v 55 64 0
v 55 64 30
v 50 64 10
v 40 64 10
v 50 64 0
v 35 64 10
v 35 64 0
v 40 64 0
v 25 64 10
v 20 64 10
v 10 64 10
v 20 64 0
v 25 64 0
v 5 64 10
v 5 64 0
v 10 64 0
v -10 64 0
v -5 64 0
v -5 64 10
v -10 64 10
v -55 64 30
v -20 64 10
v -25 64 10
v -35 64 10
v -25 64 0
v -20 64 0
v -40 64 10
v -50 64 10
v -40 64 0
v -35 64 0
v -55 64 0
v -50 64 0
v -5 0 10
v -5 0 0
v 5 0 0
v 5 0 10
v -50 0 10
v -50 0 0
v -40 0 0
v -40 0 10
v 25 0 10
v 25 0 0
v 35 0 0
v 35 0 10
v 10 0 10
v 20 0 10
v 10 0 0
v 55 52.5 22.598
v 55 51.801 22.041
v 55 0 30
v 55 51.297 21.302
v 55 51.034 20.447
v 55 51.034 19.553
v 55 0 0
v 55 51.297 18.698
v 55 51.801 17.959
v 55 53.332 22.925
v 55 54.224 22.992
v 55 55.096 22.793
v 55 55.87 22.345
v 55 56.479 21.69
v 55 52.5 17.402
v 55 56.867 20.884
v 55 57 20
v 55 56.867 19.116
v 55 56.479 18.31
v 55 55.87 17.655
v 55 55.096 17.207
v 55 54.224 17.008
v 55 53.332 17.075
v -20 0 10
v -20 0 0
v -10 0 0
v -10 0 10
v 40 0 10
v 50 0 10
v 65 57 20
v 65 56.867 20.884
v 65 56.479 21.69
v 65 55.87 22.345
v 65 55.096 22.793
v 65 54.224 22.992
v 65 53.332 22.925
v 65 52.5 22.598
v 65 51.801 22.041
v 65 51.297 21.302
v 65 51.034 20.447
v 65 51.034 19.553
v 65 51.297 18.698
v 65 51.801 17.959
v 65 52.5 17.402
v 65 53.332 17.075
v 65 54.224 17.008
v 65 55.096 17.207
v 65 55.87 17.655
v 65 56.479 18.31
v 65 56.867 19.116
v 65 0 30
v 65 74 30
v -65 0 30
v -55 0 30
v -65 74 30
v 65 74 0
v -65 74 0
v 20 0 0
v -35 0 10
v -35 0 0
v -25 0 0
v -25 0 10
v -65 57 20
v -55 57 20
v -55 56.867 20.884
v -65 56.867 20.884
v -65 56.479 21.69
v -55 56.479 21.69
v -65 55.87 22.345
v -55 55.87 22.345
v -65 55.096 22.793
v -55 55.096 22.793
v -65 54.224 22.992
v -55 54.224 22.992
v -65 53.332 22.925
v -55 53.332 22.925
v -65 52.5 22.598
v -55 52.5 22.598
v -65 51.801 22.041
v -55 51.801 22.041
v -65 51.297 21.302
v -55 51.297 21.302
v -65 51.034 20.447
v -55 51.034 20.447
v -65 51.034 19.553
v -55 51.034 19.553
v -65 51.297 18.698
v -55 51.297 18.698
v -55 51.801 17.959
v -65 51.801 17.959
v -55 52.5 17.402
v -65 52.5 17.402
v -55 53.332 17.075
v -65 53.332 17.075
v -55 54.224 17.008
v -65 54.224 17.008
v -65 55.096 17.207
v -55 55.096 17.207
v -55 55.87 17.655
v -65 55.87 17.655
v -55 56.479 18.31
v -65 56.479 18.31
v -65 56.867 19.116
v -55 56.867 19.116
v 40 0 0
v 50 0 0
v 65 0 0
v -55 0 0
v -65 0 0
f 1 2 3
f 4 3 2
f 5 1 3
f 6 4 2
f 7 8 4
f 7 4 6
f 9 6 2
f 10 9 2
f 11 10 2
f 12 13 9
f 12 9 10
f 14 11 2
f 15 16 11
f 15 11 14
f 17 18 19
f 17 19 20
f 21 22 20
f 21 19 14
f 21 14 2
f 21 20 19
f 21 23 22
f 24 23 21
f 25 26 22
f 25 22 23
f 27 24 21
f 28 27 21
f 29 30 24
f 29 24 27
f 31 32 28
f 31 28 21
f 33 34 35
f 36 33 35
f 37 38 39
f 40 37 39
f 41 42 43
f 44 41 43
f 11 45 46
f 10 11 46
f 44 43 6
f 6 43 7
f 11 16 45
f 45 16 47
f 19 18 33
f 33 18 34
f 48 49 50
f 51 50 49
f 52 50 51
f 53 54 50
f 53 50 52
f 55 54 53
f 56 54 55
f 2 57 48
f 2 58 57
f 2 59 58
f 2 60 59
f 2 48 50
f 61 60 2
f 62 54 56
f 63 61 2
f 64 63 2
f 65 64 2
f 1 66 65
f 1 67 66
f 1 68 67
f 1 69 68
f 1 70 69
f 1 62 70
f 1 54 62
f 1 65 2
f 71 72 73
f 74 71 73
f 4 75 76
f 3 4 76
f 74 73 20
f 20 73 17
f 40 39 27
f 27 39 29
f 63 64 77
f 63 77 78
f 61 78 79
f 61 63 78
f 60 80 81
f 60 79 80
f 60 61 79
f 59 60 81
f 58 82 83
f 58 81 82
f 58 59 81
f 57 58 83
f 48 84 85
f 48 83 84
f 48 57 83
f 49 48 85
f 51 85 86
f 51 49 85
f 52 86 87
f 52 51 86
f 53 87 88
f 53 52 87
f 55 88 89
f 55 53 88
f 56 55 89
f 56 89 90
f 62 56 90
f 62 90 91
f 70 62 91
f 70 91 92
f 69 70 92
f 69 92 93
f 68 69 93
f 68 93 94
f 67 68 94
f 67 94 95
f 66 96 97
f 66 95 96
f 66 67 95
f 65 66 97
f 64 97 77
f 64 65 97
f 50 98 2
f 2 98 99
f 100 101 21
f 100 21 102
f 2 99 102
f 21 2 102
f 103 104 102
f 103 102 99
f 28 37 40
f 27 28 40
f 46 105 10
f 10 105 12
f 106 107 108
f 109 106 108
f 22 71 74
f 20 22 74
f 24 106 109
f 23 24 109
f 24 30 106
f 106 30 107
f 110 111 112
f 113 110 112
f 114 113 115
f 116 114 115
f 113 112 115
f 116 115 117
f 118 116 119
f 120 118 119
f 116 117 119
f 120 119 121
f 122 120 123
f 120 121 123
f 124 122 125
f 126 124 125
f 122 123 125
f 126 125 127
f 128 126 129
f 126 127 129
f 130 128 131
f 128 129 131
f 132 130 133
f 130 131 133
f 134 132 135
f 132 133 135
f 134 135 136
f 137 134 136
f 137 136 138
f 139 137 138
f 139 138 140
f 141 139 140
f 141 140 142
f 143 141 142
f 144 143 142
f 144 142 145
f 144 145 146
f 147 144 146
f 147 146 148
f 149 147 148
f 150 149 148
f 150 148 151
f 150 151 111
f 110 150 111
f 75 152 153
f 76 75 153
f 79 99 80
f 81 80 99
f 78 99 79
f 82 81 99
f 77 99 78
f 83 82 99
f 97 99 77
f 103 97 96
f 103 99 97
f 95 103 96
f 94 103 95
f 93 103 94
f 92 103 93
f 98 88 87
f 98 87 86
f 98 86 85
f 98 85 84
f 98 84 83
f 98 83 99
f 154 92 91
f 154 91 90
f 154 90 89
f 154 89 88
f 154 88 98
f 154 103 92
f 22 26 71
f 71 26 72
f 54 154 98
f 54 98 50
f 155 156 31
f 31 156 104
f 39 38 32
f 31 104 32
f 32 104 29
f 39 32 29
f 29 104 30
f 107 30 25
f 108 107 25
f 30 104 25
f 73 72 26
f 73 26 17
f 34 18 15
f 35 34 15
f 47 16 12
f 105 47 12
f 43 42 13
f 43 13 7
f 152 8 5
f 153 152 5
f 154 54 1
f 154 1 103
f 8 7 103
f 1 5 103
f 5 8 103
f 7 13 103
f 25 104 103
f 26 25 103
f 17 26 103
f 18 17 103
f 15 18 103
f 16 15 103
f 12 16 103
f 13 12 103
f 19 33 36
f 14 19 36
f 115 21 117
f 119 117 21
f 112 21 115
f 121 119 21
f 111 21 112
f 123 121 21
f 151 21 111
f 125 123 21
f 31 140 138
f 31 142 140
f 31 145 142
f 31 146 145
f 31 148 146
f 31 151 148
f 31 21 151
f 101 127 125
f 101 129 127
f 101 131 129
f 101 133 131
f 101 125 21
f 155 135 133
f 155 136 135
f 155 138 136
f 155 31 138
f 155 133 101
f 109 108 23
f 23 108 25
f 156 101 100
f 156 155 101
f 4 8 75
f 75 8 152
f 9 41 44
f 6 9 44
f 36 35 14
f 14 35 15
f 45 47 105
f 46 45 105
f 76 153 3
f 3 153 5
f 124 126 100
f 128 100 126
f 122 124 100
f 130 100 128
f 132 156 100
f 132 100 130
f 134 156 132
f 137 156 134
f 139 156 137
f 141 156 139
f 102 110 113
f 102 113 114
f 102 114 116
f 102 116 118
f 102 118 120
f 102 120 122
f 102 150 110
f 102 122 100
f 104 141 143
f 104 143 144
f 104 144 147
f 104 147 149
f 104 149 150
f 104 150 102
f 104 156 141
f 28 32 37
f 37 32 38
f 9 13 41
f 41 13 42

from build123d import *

# Parameters (mm, degrees)
PAD_DEPTH         = 10
PAD001_DEPTH      = 20
SKETCH002_R       = 3
POCKET_DEPTH      = 10.001
POCKET_DEPTH_BACK = -120.001


with BuildPart() as part:
    # Sketch → Pad (new body)
    with BuildSketch(Plane.XY):
        Polygon((-65, 0), (-55, 0), (-55, 64), (-50, 64), (-50, 0), (-40, 0), (-40, 64), (-35, 64), (-35, 0), (-25, 0), (-25, 64), (-20, 64), (-20, 0), (-10, 0), (-10, 64), (-5, 64), (-5, 0), (5, 0), (5, 64), (10, 64), (10, 0), (20, 0), (20, 64), (25, 64), (25, 0), (35, 0), (35, 64), (40, 64), (40, 0), (50, 0), (50, 64), (55, 64), (55, 0), (65, 0), (65, 74), (-65, 74), align=None)
    extrude(amount=PAD_DEPTH)

    # Sketch001 (on Face38 of Pad) → Pad001 (join)
    with BuildSketch(Plane.XY.offset(10)):
        Polygon((-55, 0), (-65, 0), (-65, 74), (65, 74), (65, 0), (55, 0), (55, 64), (-55, 64), align=None)
    extrude(amount=PAD001_DEPTH)

    # Sketch002 (on Face34 of Pad001) → Pocket (cut, two sides)
    with BuildSketch(Plane.YZ.offset(-55)) as pocket_sk:
        with Locations((54, 20)):
            Circle(SKETCH002_R)
    extrude(amount=-POCKET_DEPTH, mode=Mode.SUBTRACT)
    extrude(pocket_sk.sketch, amount=-POCKET_DEPTH_BACK, mode=Mode.SUBTRACT)


solid = part.part
